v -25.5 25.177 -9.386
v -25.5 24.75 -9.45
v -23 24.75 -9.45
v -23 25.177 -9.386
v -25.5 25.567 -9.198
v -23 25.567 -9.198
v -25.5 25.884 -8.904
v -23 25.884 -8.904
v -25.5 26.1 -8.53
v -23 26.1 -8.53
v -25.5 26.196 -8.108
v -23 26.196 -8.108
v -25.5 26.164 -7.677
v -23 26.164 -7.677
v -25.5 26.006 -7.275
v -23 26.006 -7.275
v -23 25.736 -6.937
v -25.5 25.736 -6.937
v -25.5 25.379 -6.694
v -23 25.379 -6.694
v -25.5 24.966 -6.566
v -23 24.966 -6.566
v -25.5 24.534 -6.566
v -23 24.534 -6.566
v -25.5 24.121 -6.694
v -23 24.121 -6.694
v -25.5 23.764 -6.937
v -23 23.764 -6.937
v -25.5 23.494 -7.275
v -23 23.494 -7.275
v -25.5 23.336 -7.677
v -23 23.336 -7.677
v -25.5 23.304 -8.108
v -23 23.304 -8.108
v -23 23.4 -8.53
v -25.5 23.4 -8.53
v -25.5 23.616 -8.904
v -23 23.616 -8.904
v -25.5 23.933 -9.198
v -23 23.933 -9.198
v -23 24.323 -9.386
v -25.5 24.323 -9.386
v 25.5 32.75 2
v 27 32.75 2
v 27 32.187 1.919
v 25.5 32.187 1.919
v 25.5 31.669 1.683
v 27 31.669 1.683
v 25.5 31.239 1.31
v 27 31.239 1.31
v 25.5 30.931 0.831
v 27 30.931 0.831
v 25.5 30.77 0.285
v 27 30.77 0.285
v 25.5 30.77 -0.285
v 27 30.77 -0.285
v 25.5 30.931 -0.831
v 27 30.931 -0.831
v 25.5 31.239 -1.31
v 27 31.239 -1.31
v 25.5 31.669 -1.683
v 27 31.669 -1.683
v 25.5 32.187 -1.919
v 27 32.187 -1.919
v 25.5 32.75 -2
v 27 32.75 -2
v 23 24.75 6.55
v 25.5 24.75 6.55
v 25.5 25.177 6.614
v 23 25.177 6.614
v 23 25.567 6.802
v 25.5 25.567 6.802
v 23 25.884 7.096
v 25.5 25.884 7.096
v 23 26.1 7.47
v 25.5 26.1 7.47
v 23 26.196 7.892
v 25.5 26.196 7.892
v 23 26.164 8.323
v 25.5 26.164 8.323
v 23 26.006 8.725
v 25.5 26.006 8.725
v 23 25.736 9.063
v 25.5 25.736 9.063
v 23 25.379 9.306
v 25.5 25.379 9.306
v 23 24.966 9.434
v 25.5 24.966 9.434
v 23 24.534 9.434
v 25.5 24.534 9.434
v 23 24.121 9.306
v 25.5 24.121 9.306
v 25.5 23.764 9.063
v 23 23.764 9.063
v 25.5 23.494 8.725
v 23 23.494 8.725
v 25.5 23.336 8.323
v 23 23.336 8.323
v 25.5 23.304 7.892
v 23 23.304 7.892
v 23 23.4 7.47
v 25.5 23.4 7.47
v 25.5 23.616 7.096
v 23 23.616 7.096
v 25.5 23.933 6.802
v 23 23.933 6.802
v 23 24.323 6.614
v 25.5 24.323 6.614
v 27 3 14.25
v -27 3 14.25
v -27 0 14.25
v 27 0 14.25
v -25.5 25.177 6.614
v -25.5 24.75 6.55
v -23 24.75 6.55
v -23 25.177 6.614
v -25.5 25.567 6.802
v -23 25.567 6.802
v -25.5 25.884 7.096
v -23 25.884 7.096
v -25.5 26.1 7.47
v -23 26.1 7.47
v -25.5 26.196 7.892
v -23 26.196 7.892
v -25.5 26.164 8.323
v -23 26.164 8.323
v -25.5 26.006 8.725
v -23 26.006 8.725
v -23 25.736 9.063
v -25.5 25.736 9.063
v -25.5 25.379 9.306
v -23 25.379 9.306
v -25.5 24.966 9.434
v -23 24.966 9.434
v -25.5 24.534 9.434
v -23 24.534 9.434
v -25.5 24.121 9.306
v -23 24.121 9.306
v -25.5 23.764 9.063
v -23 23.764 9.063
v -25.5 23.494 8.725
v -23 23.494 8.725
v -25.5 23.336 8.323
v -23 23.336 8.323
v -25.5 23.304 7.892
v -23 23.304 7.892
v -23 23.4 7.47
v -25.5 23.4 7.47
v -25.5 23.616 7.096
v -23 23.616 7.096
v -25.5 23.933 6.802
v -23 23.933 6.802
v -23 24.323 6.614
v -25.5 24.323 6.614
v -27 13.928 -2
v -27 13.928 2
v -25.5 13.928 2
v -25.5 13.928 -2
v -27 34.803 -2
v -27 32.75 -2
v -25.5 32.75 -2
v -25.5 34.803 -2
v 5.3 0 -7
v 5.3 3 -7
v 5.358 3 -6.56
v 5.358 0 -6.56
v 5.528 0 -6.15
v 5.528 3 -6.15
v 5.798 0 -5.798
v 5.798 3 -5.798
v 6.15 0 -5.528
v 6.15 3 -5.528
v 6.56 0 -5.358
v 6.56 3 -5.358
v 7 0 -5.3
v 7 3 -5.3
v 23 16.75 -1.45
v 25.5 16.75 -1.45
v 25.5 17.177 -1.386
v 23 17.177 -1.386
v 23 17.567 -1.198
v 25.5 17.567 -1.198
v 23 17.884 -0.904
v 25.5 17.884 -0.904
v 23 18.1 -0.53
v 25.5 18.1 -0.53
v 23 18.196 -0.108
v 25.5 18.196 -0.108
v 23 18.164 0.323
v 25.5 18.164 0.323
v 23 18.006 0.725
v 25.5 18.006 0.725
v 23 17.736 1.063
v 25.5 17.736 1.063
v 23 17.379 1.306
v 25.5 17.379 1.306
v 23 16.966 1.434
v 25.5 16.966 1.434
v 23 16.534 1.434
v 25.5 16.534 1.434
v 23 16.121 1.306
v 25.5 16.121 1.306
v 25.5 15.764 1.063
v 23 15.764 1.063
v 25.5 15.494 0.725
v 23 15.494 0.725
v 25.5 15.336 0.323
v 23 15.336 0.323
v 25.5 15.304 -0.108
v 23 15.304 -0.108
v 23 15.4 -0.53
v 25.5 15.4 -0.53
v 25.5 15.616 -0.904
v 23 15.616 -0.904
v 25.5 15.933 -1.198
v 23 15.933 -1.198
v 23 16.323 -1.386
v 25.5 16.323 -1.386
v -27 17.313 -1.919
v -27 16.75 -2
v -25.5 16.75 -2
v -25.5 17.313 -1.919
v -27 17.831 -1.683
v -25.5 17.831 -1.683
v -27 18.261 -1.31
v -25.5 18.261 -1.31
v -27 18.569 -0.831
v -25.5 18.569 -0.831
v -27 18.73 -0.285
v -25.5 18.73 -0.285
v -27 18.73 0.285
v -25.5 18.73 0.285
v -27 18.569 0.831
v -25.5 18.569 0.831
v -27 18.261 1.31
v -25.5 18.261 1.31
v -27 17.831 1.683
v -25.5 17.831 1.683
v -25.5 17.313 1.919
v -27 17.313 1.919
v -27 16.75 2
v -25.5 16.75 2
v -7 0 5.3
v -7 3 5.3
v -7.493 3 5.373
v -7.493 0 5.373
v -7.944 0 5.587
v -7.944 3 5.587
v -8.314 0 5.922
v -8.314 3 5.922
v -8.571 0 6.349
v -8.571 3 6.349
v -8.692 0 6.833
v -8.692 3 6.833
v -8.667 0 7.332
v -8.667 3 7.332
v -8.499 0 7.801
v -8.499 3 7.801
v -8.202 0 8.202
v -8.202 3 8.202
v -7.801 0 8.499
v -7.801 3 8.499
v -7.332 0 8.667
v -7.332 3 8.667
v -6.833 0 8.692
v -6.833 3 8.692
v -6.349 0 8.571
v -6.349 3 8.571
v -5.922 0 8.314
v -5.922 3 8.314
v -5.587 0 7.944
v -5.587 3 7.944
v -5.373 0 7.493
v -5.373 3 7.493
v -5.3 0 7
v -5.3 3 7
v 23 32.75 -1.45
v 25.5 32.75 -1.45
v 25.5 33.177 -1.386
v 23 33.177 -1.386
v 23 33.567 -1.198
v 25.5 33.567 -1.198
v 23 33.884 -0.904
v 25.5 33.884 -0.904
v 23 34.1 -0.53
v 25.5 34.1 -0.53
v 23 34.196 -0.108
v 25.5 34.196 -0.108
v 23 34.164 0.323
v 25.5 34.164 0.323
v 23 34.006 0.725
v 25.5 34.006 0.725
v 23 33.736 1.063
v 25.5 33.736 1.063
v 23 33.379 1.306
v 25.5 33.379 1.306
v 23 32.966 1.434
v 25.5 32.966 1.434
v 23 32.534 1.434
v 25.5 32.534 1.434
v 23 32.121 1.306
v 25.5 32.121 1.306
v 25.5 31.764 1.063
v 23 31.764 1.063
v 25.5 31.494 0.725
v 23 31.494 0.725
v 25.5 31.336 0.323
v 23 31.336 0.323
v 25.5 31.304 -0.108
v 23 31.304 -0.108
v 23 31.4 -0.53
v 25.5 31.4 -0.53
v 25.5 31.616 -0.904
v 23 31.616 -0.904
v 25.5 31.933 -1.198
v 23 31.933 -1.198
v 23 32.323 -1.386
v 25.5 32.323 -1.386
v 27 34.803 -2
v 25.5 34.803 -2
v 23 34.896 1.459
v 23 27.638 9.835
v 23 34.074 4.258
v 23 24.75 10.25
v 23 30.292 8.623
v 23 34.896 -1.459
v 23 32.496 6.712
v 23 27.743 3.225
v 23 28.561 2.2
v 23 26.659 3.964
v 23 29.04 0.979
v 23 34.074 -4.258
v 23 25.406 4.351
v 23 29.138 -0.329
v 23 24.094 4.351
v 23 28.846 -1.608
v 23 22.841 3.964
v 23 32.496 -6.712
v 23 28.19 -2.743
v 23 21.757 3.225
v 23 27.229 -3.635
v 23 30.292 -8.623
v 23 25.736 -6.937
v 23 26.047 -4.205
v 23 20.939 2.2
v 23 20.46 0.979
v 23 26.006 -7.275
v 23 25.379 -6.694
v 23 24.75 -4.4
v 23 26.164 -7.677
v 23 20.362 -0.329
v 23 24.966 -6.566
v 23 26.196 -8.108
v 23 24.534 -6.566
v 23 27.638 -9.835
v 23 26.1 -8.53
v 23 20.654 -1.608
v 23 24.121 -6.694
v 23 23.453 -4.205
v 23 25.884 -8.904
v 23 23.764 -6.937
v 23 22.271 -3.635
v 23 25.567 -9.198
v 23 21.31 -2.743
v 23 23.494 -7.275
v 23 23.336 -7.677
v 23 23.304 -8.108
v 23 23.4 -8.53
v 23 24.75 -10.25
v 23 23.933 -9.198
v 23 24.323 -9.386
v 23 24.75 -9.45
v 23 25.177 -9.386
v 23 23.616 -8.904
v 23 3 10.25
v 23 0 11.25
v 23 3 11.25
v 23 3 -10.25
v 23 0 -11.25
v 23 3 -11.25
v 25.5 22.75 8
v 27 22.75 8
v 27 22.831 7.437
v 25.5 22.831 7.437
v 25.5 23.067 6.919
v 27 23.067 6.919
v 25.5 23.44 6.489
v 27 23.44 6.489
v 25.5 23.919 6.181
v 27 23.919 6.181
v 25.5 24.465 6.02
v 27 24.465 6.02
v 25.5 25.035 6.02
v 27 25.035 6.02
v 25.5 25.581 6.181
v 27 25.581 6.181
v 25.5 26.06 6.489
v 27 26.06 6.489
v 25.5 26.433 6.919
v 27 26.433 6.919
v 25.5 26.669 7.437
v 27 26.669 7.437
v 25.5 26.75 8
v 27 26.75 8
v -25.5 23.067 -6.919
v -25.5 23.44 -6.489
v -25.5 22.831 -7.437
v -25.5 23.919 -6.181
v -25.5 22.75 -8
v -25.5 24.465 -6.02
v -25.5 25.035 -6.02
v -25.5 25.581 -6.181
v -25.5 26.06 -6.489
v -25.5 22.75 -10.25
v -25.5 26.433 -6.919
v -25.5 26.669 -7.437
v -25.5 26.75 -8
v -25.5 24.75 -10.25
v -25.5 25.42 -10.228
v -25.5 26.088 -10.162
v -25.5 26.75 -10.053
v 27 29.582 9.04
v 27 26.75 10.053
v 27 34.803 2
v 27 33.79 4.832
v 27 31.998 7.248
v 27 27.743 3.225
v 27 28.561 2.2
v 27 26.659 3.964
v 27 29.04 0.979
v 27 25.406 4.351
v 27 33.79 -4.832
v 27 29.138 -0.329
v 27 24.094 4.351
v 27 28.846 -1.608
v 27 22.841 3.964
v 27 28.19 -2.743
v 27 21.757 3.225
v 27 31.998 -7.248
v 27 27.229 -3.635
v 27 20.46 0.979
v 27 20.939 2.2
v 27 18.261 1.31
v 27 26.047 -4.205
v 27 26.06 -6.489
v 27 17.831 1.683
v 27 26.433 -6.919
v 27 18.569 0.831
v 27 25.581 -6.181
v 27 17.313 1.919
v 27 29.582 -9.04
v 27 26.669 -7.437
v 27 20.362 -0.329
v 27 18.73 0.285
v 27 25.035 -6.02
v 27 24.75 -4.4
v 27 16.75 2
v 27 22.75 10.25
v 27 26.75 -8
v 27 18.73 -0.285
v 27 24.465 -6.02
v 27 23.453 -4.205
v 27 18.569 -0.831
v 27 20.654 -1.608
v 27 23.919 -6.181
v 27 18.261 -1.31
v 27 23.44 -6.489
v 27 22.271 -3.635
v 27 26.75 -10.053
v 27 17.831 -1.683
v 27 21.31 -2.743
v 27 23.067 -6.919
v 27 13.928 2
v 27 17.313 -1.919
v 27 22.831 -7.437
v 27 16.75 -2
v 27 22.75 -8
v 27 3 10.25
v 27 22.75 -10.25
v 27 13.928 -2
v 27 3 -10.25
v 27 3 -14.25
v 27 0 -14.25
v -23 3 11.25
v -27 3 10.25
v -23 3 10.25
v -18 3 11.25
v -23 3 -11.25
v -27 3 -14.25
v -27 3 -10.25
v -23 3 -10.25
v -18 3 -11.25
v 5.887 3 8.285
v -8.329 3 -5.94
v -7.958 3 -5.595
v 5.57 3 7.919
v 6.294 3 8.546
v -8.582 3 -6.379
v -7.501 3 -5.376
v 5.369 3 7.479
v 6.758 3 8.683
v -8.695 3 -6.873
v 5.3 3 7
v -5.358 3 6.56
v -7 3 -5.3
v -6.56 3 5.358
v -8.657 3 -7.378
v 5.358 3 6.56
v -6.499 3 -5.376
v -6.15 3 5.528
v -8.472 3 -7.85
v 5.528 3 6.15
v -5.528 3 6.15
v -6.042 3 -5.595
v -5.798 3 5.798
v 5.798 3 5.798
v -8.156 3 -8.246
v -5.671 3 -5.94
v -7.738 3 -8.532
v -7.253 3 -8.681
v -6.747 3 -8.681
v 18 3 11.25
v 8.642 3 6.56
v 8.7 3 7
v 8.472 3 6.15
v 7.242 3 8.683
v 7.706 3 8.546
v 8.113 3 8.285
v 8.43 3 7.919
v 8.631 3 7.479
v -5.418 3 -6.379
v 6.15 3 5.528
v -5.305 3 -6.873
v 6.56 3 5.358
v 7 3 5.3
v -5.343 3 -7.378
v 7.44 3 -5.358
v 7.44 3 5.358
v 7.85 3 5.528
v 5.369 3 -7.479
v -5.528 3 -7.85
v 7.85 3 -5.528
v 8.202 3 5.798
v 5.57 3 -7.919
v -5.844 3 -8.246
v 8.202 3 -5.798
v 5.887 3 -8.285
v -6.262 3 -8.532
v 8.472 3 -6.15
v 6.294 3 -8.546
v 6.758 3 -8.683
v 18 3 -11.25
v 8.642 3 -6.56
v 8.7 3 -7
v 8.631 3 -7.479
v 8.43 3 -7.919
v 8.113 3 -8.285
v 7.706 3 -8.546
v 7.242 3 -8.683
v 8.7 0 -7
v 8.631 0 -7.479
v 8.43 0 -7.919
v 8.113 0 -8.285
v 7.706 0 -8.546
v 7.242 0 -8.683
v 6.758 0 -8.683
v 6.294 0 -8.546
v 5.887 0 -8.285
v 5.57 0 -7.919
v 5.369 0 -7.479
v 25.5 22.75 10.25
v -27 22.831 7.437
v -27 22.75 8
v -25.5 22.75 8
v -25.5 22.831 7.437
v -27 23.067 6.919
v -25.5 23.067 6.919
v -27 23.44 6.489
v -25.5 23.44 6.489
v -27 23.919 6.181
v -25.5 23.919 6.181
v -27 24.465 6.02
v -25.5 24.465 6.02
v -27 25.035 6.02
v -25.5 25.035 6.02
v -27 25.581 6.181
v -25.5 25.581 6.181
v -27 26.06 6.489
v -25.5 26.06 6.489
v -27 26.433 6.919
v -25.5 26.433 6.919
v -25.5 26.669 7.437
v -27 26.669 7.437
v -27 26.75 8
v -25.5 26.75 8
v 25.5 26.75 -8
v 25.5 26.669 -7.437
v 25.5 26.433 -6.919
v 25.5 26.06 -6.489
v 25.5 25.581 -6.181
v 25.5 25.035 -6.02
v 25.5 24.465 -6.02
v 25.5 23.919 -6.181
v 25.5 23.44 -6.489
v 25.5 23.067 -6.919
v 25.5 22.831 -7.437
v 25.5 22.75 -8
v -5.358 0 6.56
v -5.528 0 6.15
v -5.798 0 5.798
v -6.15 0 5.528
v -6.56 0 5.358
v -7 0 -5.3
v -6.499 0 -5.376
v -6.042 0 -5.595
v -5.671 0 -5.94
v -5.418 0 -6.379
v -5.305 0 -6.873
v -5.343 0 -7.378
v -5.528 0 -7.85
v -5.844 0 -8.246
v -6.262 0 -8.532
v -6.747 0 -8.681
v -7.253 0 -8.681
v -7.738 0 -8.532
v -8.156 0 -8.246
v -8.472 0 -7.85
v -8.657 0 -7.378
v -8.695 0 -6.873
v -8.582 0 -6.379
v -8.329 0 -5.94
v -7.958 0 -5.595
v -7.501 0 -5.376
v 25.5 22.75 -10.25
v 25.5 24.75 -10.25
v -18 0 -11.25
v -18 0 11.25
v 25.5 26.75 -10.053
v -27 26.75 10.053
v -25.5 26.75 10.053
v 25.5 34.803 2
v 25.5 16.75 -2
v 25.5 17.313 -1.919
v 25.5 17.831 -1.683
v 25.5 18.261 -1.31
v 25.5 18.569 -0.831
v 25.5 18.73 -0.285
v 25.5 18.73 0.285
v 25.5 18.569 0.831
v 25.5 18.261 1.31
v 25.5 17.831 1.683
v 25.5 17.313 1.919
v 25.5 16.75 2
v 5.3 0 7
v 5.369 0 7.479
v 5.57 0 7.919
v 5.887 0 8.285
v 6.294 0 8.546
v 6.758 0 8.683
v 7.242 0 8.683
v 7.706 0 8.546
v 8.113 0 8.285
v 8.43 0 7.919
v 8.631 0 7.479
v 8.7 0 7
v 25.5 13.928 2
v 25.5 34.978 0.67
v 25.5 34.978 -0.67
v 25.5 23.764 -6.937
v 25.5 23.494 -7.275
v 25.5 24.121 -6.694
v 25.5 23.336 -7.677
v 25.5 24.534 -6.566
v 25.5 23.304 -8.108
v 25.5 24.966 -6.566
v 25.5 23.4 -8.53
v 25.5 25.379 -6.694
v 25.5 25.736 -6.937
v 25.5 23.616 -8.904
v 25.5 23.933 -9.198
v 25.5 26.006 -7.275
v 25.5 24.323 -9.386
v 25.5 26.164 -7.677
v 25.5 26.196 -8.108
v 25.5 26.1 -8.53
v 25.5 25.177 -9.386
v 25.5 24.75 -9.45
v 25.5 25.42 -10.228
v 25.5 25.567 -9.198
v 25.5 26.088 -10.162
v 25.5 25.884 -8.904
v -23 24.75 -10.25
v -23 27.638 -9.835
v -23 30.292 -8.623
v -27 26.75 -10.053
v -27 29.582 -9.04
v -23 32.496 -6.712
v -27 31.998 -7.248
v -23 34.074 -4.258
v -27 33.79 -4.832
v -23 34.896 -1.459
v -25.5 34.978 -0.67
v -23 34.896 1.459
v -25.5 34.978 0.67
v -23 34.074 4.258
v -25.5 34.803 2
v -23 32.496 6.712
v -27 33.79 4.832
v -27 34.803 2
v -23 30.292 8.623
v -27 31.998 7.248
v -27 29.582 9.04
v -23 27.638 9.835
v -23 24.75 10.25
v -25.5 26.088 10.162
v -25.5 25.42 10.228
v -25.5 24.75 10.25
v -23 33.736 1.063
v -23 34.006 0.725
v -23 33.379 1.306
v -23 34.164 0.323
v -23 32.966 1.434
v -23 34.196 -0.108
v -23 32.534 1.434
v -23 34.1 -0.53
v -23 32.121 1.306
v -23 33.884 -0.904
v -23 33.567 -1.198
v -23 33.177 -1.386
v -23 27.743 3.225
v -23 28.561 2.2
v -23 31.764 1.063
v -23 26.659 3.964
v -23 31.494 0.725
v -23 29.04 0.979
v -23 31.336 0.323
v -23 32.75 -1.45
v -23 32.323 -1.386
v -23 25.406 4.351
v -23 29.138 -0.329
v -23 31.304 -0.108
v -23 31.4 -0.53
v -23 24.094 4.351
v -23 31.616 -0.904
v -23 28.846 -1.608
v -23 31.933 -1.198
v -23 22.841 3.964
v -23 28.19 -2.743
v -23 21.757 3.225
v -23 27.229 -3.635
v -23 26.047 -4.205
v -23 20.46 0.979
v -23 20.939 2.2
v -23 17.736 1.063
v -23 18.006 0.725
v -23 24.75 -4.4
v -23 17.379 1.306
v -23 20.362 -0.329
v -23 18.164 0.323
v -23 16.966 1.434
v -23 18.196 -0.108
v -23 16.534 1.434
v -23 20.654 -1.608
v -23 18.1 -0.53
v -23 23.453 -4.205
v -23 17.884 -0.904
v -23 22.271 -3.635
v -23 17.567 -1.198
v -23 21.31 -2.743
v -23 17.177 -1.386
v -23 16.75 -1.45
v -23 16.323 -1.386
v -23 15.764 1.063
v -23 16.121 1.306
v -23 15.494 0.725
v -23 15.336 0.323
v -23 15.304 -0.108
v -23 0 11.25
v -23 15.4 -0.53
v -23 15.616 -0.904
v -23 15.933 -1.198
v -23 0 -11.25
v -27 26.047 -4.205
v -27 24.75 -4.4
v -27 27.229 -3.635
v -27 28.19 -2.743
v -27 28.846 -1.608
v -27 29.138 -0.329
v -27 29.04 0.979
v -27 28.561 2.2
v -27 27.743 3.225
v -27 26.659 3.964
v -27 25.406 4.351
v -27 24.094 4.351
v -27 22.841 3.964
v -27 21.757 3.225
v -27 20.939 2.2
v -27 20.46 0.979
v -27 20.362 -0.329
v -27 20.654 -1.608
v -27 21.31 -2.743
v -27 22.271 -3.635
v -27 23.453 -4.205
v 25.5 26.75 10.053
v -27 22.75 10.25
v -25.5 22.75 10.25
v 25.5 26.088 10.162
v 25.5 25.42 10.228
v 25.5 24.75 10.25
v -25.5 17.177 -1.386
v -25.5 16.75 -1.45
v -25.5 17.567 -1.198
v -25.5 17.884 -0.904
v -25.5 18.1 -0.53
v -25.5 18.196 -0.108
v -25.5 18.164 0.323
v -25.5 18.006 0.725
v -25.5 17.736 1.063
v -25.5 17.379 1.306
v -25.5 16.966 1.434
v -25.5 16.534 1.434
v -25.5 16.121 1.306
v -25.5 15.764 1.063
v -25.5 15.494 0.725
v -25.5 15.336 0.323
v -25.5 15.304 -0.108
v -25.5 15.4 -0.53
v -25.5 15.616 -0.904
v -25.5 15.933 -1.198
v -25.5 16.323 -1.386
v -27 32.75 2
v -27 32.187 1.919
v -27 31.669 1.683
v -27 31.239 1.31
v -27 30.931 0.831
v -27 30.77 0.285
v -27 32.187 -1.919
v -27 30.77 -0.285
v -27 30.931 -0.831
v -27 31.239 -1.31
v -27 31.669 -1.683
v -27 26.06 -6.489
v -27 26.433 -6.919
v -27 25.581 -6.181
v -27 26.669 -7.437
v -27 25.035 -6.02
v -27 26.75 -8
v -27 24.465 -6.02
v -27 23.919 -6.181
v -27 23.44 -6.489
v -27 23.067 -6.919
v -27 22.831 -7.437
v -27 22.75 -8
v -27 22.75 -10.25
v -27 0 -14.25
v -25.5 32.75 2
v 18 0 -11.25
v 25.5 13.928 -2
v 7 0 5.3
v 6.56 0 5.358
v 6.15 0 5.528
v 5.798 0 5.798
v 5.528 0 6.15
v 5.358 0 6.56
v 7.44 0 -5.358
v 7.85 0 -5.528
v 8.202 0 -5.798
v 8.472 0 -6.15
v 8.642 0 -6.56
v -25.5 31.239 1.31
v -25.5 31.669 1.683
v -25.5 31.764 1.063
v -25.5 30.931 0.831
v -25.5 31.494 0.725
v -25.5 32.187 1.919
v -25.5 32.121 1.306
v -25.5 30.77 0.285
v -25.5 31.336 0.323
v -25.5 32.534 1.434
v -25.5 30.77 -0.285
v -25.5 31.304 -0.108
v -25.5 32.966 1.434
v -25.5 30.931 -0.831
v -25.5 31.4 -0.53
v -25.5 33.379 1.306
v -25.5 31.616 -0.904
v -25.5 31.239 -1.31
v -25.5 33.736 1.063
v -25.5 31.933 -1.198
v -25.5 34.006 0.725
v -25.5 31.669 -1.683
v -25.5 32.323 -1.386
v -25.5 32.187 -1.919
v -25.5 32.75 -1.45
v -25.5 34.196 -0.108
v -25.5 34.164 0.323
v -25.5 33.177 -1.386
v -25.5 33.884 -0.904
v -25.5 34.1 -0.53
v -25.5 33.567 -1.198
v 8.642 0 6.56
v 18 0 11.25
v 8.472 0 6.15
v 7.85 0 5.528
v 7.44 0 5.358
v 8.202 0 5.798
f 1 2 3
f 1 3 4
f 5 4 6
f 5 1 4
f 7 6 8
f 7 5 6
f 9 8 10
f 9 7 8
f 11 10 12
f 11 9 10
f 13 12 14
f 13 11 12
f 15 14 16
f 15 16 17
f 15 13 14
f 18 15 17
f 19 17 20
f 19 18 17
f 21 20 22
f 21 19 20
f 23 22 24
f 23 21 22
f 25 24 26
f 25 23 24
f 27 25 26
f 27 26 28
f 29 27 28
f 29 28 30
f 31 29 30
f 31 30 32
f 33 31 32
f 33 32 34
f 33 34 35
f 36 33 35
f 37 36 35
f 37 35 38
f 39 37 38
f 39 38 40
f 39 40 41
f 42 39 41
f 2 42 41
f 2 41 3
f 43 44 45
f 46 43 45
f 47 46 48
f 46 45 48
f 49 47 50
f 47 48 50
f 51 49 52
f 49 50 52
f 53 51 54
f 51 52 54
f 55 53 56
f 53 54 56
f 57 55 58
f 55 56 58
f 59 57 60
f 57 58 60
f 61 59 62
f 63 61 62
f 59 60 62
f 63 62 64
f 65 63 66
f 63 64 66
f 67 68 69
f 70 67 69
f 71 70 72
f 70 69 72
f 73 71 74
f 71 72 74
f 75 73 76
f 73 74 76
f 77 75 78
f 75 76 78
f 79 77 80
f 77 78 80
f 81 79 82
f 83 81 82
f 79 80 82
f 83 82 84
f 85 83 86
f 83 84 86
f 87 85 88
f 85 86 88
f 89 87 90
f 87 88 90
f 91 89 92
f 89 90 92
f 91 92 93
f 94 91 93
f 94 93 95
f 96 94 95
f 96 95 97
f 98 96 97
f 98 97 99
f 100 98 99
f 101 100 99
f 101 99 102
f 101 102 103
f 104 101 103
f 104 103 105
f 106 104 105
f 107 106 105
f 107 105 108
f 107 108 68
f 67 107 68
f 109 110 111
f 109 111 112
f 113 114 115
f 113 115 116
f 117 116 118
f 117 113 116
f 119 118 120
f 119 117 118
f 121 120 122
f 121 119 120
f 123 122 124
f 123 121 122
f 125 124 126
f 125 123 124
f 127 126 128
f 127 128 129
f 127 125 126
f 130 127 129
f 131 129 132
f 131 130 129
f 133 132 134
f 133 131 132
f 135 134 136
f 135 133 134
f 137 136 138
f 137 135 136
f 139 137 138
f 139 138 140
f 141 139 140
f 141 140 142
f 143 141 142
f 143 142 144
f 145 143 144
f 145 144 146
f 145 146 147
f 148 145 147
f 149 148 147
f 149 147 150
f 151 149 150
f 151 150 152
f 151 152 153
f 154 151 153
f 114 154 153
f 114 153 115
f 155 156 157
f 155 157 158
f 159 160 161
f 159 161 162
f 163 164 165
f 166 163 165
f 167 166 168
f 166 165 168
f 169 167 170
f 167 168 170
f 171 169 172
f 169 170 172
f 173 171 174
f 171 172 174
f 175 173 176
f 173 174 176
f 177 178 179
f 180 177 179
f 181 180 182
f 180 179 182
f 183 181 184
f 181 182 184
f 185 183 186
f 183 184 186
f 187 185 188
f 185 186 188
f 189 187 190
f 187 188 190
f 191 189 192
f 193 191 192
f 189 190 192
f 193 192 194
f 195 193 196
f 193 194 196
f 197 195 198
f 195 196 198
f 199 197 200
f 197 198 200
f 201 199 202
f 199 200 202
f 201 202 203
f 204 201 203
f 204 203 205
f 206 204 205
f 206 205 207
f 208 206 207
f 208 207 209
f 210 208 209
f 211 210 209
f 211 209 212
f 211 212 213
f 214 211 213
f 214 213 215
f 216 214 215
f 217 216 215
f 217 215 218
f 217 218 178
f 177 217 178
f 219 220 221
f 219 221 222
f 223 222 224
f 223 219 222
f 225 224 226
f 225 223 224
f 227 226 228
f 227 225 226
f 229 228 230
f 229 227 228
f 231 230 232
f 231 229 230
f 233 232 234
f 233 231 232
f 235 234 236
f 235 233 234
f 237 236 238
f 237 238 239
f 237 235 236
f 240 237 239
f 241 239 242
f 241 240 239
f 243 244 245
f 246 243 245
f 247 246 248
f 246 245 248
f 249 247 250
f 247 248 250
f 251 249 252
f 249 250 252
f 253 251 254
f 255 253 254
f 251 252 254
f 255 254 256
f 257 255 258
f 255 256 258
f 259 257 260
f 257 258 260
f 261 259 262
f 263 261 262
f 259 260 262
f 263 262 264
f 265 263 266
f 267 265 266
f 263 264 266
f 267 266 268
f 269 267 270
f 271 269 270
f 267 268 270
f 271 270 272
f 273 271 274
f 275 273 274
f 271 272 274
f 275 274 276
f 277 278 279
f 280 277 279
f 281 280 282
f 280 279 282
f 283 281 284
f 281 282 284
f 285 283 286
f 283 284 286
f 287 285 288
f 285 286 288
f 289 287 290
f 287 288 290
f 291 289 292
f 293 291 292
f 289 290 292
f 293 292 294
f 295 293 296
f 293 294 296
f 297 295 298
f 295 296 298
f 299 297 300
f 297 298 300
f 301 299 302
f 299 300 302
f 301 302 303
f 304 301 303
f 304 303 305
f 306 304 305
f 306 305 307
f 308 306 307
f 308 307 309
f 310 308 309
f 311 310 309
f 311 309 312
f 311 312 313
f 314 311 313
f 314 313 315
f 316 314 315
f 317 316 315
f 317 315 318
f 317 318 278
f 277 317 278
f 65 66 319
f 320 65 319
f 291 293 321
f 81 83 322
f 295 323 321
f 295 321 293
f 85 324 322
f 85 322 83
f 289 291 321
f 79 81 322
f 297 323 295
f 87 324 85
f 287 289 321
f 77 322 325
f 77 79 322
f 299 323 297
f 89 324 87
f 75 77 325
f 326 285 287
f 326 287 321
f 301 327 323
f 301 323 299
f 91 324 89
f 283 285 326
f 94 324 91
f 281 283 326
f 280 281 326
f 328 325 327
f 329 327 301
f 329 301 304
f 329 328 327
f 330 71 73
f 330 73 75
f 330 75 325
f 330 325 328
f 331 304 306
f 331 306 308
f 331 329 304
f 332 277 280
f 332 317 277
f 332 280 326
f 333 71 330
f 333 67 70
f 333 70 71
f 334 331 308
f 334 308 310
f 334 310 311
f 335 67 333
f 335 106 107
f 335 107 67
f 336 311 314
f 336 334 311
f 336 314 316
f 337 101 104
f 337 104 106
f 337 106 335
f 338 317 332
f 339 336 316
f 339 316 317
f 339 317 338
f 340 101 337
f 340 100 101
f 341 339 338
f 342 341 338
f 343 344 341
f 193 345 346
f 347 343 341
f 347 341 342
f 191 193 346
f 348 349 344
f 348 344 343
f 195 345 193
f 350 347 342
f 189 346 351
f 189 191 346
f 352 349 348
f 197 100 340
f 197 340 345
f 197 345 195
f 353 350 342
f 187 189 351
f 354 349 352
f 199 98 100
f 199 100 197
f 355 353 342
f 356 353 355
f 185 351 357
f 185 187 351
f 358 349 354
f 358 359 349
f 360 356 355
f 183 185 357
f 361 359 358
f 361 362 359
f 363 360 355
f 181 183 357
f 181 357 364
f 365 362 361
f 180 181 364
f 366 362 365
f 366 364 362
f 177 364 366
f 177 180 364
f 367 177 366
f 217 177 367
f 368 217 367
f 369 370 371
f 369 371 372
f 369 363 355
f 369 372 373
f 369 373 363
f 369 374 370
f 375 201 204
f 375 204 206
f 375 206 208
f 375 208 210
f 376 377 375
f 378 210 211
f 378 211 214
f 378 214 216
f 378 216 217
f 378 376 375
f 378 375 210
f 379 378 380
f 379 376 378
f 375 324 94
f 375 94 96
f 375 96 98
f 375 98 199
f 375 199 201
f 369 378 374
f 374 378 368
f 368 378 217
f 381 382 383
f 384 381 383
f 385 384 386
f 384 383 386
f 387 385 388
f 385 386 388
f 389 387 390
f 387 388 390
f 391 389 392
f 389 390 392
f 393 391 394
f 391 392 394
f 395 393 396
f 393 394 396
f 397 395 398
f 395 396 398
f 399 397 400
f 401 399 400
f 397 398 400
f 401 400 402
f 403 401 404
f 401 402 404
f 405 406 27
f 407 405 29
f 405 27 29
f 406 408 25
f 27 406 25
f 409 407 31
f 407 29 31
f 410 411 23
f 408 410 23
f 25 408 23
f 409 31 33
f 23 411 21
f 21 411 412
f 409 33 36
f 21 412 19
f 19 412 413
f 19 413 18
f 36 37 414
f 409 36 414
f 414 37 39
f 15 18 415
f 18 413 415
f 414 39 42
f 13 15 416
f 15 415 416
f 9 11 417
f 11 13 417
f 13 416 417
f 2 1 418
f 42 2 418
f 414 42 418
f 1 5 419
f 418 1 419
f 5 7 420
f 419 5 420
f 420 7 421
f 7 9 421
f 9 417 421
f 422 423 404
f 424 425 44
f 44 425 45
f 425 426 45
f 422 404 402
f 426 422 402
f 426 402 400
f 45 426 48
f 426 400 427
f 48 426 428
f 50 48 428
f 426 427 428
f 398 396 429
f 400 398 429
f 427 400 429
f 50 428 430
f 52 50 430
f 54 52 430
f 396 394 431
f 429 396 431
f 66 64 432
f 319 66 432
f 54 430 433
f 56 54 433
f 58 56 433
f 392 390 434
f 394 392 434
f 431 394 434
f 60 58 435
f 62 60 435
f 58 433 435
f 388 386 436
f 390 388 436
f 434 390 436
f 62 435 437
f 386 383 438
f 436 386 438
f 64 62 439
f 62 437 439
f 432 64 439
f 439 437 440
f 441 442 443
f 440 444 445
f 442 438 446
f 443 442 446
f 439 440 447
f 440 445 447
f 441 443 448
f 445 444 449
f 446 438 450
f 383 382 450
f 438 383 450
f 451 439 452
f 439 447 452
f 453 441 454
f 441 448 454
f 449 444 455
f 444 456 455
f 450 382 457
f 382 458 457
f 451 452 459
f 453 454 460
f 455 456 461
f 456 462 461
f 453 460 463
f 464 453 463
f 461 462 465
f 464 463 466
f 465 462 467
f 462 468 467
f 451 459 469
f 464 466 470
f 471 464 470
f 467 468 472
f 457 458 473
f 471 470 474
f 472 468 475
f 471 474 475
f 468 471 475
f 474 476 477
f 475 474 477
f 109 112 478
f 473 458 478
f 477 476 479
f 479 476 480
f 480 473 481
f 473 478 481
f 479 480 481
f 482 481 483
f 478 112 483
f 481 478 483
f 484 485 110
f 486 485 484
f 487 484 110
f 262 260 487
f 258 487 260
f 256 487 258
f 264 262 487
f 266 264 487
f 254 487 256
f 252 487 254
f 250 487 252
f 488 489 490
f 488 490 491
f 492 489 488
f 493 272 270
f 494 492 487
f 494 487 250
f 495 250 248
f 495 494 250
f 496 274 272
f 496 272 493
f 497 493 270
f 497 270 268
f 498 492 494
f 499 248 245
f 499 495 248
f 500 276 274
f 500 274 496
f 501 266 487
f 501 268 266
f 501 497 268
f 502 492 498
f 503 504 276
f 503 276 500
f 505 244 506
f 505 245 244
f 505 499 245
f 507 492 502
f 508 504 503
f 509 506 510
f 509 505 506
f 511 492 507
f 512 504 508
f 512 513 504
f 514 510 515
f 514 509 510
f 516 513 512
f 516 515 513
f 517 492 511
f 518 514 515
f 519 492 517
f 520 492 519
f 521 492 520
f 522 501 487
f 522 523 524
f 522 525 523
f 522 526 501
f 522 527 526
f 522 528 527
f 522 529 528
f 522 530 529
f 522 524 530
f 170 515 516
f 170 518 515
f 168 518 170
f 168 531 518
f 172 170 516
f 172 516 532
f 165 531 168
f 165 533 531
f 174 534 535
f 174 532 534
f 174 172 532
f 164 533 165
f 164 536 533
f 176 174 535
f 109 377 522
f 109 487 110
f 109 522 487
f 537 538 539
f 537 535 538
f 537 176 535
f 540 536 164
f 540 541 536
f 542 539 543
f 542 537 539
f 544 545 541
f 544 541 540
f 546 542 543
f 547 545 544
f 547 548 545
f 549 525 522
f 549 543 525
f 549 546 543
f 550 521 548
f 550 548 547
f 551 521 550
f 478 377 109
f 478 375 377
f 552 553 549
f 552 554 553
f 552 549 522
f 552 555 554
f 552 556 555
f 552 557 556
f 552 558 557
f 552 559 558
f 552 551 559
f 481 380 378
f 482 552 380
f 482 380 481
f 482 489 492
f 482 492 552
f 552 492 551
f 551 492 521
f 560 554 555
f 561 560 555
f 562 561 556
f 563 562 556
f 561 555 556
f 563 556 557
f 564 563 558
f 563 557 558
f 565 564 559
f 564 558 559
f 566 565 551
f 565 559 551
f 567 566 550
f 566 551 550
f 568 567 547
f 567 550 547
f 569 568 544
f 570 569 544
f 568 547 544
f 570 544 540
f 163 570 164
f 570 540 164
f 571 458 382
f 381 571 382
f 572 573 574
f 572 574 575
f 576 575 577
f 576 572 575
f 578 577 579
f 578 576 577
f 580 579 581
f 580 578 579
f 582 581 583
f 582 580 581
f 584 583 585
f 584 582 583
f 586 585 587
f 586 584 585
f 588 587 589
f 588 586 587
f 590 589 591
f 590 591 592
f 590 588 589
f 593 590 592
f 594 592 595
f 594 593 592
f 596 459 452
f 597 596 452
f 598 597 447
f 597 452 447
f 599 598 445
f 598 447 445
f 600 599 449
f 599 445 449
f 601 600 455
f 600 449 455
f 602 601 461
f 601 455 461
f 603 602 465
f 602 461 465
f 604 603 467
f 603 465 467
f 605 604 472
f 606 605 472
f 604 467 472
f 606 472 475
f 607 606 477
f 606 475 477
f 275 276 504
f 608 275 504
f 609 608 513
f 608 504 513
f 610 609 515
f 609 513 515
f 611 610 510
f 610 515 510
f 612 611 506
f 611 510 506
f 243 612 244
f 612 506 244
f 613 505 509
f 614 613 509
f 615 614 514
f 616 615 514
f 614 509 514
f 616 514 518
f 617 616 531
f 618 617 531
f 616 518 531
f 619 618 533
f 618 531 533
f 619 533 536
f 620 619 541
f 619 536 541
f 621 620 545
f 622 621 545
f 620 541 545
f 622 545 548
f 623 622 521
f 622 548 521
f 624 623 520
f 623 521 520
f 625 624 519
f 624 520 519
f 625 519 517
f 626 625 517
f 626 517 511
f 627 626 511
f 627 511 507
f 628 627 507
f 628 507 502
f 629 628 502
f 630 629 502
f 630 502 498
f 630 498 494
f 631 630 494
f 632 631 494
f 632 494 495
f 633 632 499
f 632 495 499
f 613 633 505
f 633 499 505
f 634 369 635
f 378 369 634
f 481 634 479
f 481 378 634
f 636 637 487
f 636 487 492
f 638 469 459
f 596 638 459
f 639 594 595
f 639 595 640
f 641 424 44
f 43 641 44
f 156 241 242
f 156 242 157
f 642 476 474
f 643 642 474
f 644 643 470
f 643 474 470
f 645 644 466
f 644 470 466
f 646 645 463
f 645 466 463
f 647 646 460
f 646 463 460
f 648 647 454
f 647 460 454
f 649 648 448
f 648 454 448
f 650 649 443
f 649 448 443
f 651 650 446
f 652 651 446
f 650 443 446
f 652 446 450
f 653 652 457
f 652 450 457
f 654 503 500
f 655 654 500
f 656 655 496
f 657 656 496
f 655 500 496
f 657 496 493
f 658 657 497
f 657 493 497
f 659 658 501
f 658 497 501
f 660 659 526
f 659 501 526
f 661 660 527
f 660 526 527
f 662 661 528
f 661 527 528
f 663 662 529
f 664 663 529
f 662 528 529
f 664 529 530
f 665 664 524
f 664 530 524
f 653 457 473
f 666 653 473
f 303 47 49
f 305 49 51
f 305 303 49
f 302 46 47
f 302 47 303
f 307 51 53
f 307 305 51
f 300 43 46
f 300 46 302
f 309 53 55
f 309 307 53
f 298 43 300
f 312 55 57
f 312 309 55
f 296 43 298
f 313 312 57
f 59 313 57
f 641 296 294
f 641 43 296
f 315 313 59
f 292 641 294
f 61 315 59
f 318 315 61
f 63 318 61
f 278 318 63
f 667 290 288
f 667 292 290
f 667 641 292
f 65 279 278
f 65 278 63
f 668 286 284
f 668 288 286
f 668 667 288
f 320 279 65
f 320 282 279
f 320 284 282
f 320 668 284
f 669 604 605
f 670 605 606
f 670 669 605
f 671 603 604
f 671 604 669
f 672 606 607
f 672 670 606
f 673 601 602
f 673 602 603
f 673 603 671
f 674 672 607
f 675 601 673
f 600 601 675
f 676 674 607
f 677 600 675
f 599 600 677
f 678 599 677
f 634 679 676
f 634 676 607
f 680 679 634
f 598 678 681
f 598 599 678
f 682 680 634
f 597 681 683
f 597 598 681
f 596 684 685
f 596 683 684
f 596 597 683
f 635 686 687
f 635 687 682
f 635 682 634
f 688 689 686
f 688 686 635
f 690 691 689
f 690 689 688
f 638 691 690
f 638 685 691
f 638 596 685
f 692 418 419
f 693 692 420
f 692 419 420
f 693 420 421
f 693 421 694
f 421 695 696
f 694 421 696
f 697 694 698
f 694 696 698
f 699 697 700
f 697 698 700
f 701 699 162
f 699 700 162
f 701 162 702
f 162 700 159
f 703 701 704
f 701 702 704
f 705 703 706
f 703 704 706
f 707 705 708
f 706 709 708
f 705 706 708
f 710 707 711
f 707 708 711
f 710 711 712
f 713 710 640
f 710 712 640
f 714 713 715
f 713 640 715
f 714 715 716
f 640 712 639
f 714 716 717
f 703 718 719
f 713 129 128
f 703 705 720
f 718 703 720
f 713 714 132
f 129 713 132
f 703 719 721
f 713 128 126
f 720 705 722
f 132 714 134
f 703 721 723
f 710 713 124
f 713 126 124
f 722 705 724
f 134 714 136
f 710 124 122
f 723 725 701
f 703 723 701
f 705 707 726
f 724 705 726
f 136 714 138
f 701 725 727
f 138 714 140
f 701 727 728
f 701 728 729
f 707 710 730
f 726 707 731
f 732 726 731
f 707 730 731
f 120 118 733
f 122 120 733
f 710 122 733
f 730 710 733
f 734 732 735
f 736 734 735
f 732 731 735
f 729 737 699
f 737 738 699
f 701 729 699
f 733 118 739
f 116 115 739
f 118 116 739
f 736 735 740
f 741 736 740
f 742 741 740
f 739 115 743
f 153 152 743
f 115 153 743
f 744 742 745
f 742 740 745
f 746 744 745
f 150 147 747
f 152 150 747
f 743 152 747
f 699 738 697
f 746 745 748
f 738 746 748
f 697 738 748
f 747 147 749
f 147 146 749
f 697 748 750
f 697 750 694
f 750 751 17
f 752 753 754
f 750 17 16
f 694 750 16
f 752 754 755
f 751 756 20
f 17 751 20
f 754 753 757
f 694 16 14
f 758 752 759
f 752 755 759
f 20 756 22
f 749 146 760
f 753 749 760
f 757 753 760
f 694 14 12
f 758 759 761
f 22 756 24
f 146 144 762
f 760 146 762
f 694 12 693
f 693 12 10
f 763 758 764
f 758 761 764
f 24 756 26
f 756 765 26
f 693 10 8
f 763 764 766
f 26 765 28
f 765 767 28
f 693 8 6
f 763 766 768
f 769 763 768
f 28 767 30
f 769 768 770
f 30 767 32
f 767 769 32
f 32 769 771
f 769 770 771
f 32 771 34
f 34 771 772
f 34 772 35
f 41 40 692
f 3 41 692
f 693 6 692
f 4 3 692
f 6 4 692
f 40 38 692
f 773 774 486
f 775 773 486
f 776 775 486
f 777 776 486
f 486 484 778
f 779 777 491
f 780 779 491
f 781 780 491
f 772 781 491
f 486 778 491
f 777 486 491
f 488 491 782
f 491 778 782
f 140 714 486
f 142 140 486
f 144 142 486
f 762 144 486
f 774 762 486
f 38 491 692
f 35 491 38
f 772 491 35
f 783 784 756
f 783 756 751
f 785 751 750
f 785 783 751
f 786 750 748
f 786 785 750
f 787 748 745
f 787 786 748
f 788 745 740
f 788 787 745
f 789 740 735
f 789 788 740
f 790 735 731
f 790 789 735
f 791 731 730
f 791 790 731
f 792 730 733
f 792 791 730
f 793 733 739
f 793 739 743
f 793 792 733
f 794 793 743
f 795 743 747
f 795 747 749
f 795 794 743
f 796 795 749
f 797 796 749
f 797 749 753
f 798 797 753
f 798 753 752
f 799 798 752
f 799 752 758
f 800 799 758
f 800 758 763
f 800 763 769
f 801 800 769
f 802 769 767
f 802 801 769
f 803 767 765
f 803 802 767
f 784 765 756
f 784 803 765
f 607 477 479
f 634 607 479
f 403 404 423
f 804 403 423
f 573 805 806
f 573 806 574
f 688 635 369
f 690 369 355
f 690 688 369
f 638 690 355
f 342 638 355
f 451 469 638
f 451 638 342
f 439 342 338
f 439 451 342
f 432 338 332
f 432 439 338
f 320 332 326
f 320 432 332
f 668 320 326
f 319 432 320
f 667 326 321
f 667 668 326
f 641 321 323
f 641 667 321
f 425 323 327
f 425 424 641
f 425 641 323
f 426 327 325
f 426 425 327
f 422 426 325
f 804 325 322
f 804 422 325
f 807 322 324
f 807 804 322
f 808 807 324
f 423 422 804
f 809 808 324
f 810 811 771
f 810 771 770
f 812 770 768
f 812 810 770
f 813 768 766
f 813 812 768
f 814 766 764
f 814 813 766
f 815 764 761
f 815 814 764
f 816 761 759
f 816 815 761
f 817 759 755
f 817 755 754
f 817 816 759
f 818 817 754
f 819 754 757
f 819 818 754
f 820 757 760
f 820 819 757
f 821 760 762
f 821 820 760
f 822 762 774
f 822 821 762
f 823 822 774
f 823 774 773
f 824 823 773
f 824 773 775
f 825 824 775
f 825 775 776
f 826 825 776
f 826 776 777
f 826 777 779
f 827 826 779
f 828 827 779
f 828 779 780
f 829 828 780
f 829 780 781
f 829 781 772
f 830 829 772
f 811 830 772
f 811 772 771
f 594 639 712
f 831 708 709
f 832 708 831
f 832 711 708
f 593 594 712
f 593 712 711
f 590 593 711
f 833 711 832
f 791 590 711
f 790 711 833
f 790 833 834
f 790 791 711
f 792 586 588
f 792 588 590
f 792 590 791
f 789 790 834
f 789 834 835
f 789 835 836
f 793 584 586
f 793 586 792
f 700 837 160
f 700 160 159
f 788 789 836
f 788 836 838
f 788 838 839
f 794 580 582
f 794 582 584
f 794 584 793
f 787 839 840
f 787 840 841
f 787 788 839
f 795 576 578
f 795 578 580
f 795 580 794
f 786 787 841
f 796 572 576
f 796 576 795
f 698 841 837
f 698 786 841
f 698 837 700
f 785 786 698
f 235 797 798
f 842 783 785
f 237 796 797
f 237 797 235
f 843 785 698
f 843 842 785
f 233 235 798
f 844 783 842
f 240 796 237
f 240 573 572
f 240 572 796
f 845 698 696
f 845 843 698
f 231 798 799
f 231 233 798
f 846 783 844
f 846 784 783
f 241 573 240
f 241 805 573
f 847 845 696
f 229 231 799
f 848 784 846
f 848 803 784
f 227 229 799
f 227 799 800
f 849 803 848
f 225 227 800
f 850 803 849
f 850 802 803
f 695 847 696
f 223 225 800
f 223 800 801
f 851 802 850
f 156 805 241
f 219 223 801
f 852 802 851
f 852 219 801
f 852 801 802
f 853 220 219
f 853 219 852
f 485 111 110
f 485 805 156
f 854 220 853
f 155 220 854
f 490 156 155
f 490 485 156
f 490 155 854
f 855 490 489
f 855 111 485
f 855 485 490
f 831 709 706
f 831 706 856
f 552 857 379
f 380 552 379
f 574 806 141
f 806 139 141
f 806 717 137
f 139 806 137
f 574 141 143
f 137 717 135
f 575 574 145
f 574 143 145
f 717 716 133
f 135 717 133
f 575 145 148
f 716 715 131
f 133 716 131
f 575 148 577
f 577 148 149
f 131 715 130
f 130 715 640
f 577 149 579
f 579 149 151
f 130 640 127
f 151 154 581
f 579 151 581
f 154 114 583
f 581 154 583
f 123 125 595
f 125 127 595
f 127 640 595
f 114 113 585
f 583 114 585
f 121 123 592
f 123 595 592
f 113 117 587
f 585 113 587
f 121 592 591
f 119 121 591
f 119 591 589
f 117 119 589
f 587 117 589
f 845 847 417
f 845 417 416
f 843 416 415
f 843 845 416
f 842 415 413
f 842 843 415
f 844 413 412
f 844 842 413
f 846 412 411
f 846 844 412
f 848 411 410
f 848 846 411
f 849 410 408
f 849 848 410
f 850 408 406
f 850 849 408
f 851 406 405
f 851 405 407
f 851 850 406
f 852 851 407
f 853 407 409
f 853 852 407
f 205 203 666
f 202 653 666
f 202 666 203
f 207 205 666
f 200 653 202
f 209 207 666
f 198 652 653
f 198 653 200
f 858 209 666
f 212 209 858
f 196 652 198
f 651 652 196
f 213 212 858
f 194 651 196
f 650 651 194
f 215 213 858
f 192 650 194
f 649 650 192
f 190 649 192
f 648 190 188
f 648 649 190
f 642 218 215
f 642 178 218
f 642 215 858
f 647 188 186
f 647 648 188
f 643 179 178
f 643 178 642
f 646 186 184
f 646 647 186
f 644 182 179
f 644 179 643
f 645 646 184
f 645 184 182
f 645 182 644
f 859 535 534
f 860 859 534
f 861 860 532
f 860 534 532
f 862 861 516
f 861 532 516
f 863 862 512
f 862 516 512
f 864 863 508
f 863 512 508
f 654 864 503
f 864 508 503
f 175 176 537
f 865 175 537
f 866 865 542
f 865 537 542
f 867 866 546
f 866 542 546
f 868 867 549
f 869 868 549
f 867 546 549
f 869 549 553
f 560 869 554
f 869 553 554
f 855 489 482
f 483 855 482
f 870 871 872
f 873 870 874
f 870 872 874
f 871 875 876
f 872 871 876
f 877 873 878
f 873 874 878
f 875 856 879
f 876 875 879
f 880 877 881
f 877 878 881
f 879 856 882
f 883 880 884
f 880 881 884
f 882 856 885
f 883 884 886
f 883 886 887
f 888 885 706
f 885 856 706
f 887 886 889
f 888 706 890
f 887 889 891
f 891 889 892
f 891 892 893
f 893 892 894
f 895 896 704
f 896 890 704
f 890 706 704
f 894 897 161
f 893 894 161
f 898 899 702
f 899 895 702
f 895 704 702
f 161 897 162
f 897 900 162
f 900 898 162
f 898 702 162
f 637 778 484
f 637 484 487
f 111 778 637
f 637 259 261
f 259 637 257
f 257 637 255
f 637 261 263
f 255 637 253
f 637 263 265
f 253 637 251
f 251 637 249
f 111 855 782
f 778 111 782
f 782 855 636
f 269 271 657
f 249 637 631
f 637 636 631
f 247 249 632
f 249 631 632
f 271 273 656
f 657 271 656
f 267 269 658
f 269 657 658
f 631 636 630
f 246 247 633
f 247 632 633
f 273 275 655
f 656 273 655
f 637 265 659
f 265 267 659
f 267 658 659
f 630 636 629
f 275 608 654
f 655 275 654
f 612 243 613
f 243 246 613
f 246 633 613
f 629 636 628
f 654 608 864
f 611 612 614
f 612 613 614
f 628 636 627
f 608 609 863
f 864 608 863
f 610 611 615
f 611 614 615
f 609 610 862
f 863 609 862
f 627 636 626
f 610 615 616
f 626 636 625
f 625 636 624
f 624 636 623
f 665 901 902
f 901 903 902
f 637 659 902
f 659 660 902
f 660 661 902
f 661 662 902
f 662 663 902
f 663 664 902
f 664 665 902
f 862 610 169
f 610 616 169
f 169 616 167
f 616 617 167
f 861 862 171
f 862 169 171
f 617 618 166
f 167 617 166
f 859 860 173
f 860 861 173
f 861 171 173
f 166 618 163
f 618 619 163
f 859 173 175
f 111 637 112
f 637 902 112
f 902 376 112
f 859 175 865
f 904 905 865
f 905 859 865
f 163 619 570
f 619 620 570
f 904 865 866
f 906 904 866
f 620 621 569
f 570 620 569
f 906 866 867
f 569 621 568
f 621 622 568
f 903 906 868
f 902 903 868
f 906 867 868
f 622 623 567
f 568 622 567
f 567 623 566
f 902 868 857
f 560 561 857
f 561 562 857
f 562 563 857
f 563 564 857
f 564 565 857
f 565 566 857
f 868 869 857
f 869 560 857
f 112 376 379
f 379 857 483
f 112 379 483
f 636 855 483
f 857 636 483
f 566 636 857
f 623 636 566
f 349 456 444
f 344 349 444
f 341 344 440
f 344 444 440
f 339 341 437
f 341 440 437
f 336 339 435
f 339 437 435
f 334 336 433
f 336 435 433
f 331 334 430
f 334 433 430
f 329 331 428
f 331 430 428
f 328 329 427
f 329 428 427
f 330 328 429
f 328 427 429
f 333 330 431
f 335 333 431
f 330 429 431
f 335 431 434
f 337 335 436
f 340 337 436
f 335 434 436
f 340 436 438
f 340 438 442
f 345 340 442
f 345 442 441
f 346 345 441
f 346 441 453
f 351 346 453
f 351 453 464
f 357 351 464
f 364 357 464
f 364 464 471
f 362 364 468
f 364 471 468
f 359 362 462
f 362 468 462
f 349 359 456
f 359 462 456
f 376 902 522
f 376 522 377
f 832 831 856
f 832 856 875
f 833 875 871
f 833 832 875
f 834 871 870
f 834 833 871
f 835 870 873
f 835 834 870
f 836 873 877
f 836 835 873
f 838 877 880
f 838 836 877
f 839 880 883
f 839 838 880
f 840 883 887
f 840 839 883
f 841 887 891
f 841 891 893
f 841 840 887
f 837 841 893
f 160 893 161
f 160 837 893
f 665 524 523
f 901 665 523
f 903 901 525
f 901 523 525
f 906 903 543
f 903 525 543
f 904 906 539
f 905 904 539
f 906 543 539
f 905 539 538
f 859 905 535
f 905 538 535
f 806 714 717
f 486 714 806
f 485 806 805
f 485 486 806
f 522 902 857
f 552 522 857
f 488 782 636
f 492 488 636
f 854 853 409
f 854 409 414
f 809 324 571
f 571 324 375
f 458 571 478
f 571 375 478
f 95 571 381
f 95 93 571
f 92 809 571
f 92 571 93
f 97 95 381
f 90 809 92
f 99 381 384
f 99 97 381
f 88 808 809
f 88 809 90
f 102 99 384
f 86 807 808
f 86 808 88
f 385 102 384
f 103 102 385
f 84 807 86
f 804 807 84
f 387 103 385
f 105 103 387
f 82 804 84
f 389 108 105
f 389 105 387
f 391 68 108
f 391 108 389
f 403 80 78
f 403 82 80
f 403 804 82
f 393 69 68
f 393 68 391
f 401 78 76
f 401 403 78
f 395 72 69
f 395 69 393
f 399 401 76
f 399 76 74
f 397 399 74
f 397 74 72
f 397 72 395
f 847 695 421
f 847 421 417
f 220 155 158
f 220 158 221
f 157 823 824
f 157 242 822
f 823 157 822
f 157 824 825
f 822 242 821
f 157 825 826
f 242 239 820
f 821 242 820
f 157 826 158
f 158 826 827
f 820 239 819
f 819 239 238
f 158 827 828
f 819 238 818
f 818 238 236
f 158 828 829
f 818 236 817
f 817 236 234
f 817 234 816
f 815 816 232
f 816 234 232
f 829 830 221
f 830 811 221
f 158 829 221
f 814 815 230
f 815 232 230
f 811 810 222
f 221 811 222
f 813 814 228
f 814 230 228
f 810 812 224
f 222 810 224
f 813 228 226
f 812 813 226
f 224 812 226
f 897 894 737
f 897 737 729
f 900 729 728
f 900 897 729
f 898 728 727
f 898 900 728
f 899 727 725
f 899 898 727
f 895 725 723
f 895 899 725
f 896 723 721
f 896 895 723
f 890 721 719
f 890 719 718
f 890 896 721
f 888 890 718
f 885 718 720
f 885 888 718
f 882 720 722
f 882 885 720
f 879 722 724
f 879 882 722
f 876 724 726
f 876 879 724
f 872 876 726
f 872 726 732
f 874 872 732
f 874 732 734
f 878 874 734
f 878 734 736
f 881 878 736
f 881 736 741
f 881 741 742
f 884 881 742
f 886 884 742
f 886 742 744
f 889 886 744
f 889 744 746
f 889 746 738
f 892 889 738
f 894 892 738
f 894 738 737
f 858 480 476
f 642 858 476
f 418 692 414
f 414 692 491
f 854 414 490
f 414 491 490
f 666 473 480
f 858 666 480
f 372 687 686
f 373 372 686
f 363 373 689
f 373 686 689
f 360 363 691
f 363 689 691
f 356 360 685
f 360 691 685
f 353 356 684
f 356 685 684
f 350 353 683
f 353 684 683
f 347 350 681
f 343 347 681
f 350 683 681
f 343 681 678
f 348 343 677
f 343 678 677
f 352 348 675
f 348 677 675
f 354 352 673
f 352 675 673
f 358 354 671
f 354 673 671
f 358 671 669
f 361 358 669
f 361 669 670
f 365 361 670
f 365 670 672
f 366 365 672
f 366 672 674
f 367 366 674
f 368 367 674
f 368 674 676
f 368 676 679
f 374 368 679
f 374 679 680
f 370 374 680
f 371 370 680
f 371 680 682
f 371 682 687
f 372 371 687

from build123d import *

# Parameters (mm, degrees)
SKETCH1_W           = 54
SKETCH1_H           = 28.5
SKETCH1_W_2         = 5
SKETCH1_H_2         = 22.5
SKETCH1_R           = 1.7
SKETCH1_R_2         = 7.5
BOSS_EXTRUDE2_DEPTH = 3
SKETCH2_W           = 4
SKETCH2_H           = 20.5
BOSS_EXTRUDE3_DEPTH = 21.75
SKETCH4_R           = 10.25
BOSS_EXTRUDE4_DEPTH = 4
SKETCH6_R           = 4.4
SKETCH6_R_2         = 1.45
CUT_EXTRUDE3_DEPTH  = 4
SKETCH7_R           = 1.45
CUT_EXTRUDE4_DEPTH  = 1.5
SKETCH8_W           = 28.781481152
SKETCH8_H           = 28.5
BOSS_EXTRUDE5_DEPTH = 3
SKETCH9_R           = 1.7
CUT_EXTRUDE5_DEPTH  = 3


with BuildPart() as part:
    # Sketch1 → Boss-Extrude2 (new body)
    with BuildSketch(Plane(origin=(0, 0, 0), x_dir=(1, 0, 0), z_dir=(0, 1, 0))):
        Rectangle(SKETCH1_W, SKETCH1_H)
        with Locations((20.5, 0)):
            Rectangle(SKETCH1_W_2, SKETCH1_H_2, mode=Mode.SUBTRACT)
        with Locations((-20.5, 0)):
            Rectangle(SKETCH1_W_2, SKETCH1_H_2, mode=Mode.SUBTRACT)
        with Locations(Location((-9, -8.25, 0), (0, 0, 270))):
            Circle(SKETCH1_R, mode=Mode.SUBTRACT)
        with Locations(Location((9, -8.25, 0), (0, 0, 270))):
            Circle(SKETCH1_R, mode=Mode.SUBTRACT)
        with Locations(Location((-9, 8.25, 0), (0, 0, 270))):
            Circle(SKETCH1_R, mode=Mode.SUBTRACT)
        with Locations(Location((0, 0, 0), (0, 0, 270))):
            Circle(SKETCH1_R_2, mode=Mode.SUBTRACT)
        with Locations(Location((9, 8.25, 0), (0, 0, 270))):
            Circle(SKETCH1_R, mode=Mode.SUBTRACT)
    extrude(amount=BOSS_EXTRUDE2_DEPTH)

    # Sketch2 → Boss-Extrude3 (add)
    with BuildSketch(Plane(origin=(0, 3, 0), x_dir=(1, 0, 0), z_dir=(0, 1, 0))):
        with Locations((25, 0)):
            Rectangle(SKETCH2_W, SKETCH2_H)
    boss_extrude3 = extrude(amount=BOSS_EXTRUDE3_DEPTH)

    # Sketch4 → Boss-Extrude4 (add)
    with BuildSketch(Plane(origin=(27, 0, 0), x_dir=(0, 0, -1), z_dir=(1, 0, 0))):
        with Locations((0, 24.75)):
            Circle(SKETCH4_R)
    boss_extrude4 = extrude(amount=-BOSS_EXTRUDE4_DEPTH)

    # Mirror1: Boss-Extrude3, Boss-Extrude4 across plane
    add(boss_extrude3.mirror(Plane(origin=(0, 0, 0), x_dir=(0, 0, 1), z_dir=(1, 0, 0))))
    add(boss_extrude4.mirror(Plane(origin=(0, 0, 0), x_dir=(0, 0, 1), z_dir=(1, 0, 0))))

    # Sketch6 → Cut-Extrude3 (cut)
    with BuildSketch(Plane(origin=(27, 0, 0), x_dir=(0, 0, -1), z_dir=(1, 0, 0))):
        with Locations((0, 24.75)):
            Circle(SKETCH6_R)
        with Locations((0, 32.75)):
            Circle(SKETCH6_R_2)
        with Locations((8, 24.75)):
            Circle(SKETCH6_R_2)
        with Locations((0, 16.75)):
            Circle(SKETCH6_R_2)
        with Locations((-8, 24.75)):
            Circle(SKETCH6_R_2)
    cut_extrude3 = extrude(amount=-CUT_EXTRUDE3_DEPTH, mode=Mode.SUBTRACT)

    # Mirror3: Cut-Extrude3 across plane
    add(cut_extrude3.mirror(Plane(origin=(0, 0, 0), x_dir=(0, 0, 1), z_dir=(1, 0, 0))), mode=Mode.SUBTRACT)

    # Sketch7 → Cut-Extrude4 (cut)
    # profile 1 of 4: a face of its own
    with BuildSketch(Plane(origin=(27, 0, 0), x_dir=(0, 0, -1), z_dir=(1, 0, 0))):
        with BuildLine():
            ThreePointArc((10.25, 24.75), (10.200627247, 25.754840168), (10.052984631, 26.75))
            Line((10.052984631, 26.75), (8, 26.75))
            ThreePointArc((8, 26.75), (6, 24.75), (8, 22.75))
            Line((8, 22.75), (10.25, 22.75))
            Line((10.25, 22.75), (10.25, 24.75))
        make_face()
        with Locations((8, 24.75)):
            Circle(SKETCH7_R, mode=Mode.SUBTRACT)
    # profile 2 of 4: a face of its own
    with BuildSketch(Plane(origin=(27, 0, 0), x_dir=(0, 0, -1), z_dir=(1, 0, 0))):
        with BuildLine():
            Line((2, 32.75), (2, 34.802984631))
            ThreePointArc((2, 34.802984631), (0, 35), (-2, 34.802984631))
            Line((-2, 34.802984631), (-2, 32.75))
            ThreePointArc((-2, 32.75), (0, 30.75), (2, 32.75))
        make_face()
        with Locations((0, 32.75)):
            Circle(SKETCH7_R, mode=Mode.SUBTRACT)
    # profile 3 of 4: a face of its own
    with BuildSketch(Plane(origin=(27, 0, 0), x_dir=(0, 0, -1), z_dir=(1, 0, 0))):
        with BuildLine():
            Line((-8, 26.75), (-10.052984631, 26.75))
            ThreePointArc((-10.052984631, 26.75), (-10.200627247, 25.754840168), (-10.25, 24.75))
            Line((-10.25, 24.75), (-10.25, 22.75))
            Line((-10.25, 22.75), (-8, 22.75))
            ThreePointArc((-8, 22.75), (-6, 24.75), (-8, 26.75))
        make_face()
        with Locations((-8, 24.75)):
            Circle(SKETCH7_R, mode=Mode.SUBTRACT)
    # profile 4 of 4: a face of its own
    with BuildSketch(Plane(origin=(27, 0, 0), x_dir=(0, 0, -1), z_dir=(1, 0, 0))):
        with BuildLine():
            Line((-2, 16.75), (-2, 13.927640071))
            Line((-2, 13.927640071), (2, 13.927640071))
            Line((2, 13.927640071), (2, 16.75))
            ThreePointArc((2, 16.75), (0, 18.75), (-2, 16.75))
        make_face()
        with Locations((0, 16.75)):
            Circle(SKETCH7_R, mode=Mode.SUBTRACT)
    cut_extrude4 = extrude(amount=-CUT_EXTRUDE4_DEPTH, mode=Mode.SUBTRACT)

    # Mirror4: Cut-Extrude4 across plane
    add(cut_extrude4.mirror(Plane(origin=(0, 0, 0), x_dir=(0, 0, 1), z_dir=(1, 0, 0))), mode=Mode.SUBTRACT)

    # Sketch8 → Boss-Extrude5 (add)
    with BuildSketch(Plane(origin=(0, 3, 0), x_dir=(1, 0, 0), z_dir=(0, 1, 0))):
        Rectangle(SKETCH8_W, SKETCH8_H)
    extrude(amount=-BOSS_EXTRUDE5_DEPTH)

    # Sketch9 → Cut-Extrude5 (cut)
    with BuildSketch(Plane(origin=(0, 3, 0), x_dir=(1, 0, 0), z_dir=(0, 1, 0))):
        with BuildLine():
            ThreePointArc((-5.3, -7), (-5.797918472, -5.797918472), (-7, -5.3))
            Line((-7, -5.3), (-7, -7))
            Line((-7, -7), (-5.3, -7))
        make_face()
        with BuildLine():
            Line((-7, -7), (-7, -5.3))
            ThreePointArc((-7, -5.3), (-8.202081528, -8.202081528), (-5.3, -7))
            Line((-5.3, -7), (-7, -7))
        make_face()
        with BuildLine():
            ThreePointArc((8.7, -7), (8.202081528, -5.797918472), (7, -5.3))
            Line((7, -5.3), (7, -7))
            Line((7, -7), (5.3, -7))
            ThreePointArc((5.3, -7), (7, -8.7), (8.7, -7))
        make_face()
        with BuildLine():
            Line((7, -7), (7, -5.3))
            ThreePointArc((7, -5.3), (5.797918472, -5.797918472), (5.3, -7))
            Line((5.3, -7), (7, -7))
        make_face()
        with BuildLine():
            ThreePointArc((8.7, 7), (7, 8.7), (5.3, 7))
            Line((5.3, 7), (7, 7))
            Line((7, 7), (7, 5.3))
            ThreePointArc((7, 5.3), (8.202081528, 5.797918472), (8.7, 7))
        make_face()
        with BuildLine():
            Line((7, 7), (5.3, 7))
            ThreePointArc((5.3, 7), (5.797918472, 5.797918472), (7, 5.3))
            Line((7, 5.3), (7, 7))
        make_face()
        with Locations(Location((-7, 7, 0), (0, 0, 270))):
            Circle(SKETCH9_R)
    extrude(amount=-CUT_EXTRUDE5_DEPTH, mode=Mode.SUBTRACT)


solid = part.part
